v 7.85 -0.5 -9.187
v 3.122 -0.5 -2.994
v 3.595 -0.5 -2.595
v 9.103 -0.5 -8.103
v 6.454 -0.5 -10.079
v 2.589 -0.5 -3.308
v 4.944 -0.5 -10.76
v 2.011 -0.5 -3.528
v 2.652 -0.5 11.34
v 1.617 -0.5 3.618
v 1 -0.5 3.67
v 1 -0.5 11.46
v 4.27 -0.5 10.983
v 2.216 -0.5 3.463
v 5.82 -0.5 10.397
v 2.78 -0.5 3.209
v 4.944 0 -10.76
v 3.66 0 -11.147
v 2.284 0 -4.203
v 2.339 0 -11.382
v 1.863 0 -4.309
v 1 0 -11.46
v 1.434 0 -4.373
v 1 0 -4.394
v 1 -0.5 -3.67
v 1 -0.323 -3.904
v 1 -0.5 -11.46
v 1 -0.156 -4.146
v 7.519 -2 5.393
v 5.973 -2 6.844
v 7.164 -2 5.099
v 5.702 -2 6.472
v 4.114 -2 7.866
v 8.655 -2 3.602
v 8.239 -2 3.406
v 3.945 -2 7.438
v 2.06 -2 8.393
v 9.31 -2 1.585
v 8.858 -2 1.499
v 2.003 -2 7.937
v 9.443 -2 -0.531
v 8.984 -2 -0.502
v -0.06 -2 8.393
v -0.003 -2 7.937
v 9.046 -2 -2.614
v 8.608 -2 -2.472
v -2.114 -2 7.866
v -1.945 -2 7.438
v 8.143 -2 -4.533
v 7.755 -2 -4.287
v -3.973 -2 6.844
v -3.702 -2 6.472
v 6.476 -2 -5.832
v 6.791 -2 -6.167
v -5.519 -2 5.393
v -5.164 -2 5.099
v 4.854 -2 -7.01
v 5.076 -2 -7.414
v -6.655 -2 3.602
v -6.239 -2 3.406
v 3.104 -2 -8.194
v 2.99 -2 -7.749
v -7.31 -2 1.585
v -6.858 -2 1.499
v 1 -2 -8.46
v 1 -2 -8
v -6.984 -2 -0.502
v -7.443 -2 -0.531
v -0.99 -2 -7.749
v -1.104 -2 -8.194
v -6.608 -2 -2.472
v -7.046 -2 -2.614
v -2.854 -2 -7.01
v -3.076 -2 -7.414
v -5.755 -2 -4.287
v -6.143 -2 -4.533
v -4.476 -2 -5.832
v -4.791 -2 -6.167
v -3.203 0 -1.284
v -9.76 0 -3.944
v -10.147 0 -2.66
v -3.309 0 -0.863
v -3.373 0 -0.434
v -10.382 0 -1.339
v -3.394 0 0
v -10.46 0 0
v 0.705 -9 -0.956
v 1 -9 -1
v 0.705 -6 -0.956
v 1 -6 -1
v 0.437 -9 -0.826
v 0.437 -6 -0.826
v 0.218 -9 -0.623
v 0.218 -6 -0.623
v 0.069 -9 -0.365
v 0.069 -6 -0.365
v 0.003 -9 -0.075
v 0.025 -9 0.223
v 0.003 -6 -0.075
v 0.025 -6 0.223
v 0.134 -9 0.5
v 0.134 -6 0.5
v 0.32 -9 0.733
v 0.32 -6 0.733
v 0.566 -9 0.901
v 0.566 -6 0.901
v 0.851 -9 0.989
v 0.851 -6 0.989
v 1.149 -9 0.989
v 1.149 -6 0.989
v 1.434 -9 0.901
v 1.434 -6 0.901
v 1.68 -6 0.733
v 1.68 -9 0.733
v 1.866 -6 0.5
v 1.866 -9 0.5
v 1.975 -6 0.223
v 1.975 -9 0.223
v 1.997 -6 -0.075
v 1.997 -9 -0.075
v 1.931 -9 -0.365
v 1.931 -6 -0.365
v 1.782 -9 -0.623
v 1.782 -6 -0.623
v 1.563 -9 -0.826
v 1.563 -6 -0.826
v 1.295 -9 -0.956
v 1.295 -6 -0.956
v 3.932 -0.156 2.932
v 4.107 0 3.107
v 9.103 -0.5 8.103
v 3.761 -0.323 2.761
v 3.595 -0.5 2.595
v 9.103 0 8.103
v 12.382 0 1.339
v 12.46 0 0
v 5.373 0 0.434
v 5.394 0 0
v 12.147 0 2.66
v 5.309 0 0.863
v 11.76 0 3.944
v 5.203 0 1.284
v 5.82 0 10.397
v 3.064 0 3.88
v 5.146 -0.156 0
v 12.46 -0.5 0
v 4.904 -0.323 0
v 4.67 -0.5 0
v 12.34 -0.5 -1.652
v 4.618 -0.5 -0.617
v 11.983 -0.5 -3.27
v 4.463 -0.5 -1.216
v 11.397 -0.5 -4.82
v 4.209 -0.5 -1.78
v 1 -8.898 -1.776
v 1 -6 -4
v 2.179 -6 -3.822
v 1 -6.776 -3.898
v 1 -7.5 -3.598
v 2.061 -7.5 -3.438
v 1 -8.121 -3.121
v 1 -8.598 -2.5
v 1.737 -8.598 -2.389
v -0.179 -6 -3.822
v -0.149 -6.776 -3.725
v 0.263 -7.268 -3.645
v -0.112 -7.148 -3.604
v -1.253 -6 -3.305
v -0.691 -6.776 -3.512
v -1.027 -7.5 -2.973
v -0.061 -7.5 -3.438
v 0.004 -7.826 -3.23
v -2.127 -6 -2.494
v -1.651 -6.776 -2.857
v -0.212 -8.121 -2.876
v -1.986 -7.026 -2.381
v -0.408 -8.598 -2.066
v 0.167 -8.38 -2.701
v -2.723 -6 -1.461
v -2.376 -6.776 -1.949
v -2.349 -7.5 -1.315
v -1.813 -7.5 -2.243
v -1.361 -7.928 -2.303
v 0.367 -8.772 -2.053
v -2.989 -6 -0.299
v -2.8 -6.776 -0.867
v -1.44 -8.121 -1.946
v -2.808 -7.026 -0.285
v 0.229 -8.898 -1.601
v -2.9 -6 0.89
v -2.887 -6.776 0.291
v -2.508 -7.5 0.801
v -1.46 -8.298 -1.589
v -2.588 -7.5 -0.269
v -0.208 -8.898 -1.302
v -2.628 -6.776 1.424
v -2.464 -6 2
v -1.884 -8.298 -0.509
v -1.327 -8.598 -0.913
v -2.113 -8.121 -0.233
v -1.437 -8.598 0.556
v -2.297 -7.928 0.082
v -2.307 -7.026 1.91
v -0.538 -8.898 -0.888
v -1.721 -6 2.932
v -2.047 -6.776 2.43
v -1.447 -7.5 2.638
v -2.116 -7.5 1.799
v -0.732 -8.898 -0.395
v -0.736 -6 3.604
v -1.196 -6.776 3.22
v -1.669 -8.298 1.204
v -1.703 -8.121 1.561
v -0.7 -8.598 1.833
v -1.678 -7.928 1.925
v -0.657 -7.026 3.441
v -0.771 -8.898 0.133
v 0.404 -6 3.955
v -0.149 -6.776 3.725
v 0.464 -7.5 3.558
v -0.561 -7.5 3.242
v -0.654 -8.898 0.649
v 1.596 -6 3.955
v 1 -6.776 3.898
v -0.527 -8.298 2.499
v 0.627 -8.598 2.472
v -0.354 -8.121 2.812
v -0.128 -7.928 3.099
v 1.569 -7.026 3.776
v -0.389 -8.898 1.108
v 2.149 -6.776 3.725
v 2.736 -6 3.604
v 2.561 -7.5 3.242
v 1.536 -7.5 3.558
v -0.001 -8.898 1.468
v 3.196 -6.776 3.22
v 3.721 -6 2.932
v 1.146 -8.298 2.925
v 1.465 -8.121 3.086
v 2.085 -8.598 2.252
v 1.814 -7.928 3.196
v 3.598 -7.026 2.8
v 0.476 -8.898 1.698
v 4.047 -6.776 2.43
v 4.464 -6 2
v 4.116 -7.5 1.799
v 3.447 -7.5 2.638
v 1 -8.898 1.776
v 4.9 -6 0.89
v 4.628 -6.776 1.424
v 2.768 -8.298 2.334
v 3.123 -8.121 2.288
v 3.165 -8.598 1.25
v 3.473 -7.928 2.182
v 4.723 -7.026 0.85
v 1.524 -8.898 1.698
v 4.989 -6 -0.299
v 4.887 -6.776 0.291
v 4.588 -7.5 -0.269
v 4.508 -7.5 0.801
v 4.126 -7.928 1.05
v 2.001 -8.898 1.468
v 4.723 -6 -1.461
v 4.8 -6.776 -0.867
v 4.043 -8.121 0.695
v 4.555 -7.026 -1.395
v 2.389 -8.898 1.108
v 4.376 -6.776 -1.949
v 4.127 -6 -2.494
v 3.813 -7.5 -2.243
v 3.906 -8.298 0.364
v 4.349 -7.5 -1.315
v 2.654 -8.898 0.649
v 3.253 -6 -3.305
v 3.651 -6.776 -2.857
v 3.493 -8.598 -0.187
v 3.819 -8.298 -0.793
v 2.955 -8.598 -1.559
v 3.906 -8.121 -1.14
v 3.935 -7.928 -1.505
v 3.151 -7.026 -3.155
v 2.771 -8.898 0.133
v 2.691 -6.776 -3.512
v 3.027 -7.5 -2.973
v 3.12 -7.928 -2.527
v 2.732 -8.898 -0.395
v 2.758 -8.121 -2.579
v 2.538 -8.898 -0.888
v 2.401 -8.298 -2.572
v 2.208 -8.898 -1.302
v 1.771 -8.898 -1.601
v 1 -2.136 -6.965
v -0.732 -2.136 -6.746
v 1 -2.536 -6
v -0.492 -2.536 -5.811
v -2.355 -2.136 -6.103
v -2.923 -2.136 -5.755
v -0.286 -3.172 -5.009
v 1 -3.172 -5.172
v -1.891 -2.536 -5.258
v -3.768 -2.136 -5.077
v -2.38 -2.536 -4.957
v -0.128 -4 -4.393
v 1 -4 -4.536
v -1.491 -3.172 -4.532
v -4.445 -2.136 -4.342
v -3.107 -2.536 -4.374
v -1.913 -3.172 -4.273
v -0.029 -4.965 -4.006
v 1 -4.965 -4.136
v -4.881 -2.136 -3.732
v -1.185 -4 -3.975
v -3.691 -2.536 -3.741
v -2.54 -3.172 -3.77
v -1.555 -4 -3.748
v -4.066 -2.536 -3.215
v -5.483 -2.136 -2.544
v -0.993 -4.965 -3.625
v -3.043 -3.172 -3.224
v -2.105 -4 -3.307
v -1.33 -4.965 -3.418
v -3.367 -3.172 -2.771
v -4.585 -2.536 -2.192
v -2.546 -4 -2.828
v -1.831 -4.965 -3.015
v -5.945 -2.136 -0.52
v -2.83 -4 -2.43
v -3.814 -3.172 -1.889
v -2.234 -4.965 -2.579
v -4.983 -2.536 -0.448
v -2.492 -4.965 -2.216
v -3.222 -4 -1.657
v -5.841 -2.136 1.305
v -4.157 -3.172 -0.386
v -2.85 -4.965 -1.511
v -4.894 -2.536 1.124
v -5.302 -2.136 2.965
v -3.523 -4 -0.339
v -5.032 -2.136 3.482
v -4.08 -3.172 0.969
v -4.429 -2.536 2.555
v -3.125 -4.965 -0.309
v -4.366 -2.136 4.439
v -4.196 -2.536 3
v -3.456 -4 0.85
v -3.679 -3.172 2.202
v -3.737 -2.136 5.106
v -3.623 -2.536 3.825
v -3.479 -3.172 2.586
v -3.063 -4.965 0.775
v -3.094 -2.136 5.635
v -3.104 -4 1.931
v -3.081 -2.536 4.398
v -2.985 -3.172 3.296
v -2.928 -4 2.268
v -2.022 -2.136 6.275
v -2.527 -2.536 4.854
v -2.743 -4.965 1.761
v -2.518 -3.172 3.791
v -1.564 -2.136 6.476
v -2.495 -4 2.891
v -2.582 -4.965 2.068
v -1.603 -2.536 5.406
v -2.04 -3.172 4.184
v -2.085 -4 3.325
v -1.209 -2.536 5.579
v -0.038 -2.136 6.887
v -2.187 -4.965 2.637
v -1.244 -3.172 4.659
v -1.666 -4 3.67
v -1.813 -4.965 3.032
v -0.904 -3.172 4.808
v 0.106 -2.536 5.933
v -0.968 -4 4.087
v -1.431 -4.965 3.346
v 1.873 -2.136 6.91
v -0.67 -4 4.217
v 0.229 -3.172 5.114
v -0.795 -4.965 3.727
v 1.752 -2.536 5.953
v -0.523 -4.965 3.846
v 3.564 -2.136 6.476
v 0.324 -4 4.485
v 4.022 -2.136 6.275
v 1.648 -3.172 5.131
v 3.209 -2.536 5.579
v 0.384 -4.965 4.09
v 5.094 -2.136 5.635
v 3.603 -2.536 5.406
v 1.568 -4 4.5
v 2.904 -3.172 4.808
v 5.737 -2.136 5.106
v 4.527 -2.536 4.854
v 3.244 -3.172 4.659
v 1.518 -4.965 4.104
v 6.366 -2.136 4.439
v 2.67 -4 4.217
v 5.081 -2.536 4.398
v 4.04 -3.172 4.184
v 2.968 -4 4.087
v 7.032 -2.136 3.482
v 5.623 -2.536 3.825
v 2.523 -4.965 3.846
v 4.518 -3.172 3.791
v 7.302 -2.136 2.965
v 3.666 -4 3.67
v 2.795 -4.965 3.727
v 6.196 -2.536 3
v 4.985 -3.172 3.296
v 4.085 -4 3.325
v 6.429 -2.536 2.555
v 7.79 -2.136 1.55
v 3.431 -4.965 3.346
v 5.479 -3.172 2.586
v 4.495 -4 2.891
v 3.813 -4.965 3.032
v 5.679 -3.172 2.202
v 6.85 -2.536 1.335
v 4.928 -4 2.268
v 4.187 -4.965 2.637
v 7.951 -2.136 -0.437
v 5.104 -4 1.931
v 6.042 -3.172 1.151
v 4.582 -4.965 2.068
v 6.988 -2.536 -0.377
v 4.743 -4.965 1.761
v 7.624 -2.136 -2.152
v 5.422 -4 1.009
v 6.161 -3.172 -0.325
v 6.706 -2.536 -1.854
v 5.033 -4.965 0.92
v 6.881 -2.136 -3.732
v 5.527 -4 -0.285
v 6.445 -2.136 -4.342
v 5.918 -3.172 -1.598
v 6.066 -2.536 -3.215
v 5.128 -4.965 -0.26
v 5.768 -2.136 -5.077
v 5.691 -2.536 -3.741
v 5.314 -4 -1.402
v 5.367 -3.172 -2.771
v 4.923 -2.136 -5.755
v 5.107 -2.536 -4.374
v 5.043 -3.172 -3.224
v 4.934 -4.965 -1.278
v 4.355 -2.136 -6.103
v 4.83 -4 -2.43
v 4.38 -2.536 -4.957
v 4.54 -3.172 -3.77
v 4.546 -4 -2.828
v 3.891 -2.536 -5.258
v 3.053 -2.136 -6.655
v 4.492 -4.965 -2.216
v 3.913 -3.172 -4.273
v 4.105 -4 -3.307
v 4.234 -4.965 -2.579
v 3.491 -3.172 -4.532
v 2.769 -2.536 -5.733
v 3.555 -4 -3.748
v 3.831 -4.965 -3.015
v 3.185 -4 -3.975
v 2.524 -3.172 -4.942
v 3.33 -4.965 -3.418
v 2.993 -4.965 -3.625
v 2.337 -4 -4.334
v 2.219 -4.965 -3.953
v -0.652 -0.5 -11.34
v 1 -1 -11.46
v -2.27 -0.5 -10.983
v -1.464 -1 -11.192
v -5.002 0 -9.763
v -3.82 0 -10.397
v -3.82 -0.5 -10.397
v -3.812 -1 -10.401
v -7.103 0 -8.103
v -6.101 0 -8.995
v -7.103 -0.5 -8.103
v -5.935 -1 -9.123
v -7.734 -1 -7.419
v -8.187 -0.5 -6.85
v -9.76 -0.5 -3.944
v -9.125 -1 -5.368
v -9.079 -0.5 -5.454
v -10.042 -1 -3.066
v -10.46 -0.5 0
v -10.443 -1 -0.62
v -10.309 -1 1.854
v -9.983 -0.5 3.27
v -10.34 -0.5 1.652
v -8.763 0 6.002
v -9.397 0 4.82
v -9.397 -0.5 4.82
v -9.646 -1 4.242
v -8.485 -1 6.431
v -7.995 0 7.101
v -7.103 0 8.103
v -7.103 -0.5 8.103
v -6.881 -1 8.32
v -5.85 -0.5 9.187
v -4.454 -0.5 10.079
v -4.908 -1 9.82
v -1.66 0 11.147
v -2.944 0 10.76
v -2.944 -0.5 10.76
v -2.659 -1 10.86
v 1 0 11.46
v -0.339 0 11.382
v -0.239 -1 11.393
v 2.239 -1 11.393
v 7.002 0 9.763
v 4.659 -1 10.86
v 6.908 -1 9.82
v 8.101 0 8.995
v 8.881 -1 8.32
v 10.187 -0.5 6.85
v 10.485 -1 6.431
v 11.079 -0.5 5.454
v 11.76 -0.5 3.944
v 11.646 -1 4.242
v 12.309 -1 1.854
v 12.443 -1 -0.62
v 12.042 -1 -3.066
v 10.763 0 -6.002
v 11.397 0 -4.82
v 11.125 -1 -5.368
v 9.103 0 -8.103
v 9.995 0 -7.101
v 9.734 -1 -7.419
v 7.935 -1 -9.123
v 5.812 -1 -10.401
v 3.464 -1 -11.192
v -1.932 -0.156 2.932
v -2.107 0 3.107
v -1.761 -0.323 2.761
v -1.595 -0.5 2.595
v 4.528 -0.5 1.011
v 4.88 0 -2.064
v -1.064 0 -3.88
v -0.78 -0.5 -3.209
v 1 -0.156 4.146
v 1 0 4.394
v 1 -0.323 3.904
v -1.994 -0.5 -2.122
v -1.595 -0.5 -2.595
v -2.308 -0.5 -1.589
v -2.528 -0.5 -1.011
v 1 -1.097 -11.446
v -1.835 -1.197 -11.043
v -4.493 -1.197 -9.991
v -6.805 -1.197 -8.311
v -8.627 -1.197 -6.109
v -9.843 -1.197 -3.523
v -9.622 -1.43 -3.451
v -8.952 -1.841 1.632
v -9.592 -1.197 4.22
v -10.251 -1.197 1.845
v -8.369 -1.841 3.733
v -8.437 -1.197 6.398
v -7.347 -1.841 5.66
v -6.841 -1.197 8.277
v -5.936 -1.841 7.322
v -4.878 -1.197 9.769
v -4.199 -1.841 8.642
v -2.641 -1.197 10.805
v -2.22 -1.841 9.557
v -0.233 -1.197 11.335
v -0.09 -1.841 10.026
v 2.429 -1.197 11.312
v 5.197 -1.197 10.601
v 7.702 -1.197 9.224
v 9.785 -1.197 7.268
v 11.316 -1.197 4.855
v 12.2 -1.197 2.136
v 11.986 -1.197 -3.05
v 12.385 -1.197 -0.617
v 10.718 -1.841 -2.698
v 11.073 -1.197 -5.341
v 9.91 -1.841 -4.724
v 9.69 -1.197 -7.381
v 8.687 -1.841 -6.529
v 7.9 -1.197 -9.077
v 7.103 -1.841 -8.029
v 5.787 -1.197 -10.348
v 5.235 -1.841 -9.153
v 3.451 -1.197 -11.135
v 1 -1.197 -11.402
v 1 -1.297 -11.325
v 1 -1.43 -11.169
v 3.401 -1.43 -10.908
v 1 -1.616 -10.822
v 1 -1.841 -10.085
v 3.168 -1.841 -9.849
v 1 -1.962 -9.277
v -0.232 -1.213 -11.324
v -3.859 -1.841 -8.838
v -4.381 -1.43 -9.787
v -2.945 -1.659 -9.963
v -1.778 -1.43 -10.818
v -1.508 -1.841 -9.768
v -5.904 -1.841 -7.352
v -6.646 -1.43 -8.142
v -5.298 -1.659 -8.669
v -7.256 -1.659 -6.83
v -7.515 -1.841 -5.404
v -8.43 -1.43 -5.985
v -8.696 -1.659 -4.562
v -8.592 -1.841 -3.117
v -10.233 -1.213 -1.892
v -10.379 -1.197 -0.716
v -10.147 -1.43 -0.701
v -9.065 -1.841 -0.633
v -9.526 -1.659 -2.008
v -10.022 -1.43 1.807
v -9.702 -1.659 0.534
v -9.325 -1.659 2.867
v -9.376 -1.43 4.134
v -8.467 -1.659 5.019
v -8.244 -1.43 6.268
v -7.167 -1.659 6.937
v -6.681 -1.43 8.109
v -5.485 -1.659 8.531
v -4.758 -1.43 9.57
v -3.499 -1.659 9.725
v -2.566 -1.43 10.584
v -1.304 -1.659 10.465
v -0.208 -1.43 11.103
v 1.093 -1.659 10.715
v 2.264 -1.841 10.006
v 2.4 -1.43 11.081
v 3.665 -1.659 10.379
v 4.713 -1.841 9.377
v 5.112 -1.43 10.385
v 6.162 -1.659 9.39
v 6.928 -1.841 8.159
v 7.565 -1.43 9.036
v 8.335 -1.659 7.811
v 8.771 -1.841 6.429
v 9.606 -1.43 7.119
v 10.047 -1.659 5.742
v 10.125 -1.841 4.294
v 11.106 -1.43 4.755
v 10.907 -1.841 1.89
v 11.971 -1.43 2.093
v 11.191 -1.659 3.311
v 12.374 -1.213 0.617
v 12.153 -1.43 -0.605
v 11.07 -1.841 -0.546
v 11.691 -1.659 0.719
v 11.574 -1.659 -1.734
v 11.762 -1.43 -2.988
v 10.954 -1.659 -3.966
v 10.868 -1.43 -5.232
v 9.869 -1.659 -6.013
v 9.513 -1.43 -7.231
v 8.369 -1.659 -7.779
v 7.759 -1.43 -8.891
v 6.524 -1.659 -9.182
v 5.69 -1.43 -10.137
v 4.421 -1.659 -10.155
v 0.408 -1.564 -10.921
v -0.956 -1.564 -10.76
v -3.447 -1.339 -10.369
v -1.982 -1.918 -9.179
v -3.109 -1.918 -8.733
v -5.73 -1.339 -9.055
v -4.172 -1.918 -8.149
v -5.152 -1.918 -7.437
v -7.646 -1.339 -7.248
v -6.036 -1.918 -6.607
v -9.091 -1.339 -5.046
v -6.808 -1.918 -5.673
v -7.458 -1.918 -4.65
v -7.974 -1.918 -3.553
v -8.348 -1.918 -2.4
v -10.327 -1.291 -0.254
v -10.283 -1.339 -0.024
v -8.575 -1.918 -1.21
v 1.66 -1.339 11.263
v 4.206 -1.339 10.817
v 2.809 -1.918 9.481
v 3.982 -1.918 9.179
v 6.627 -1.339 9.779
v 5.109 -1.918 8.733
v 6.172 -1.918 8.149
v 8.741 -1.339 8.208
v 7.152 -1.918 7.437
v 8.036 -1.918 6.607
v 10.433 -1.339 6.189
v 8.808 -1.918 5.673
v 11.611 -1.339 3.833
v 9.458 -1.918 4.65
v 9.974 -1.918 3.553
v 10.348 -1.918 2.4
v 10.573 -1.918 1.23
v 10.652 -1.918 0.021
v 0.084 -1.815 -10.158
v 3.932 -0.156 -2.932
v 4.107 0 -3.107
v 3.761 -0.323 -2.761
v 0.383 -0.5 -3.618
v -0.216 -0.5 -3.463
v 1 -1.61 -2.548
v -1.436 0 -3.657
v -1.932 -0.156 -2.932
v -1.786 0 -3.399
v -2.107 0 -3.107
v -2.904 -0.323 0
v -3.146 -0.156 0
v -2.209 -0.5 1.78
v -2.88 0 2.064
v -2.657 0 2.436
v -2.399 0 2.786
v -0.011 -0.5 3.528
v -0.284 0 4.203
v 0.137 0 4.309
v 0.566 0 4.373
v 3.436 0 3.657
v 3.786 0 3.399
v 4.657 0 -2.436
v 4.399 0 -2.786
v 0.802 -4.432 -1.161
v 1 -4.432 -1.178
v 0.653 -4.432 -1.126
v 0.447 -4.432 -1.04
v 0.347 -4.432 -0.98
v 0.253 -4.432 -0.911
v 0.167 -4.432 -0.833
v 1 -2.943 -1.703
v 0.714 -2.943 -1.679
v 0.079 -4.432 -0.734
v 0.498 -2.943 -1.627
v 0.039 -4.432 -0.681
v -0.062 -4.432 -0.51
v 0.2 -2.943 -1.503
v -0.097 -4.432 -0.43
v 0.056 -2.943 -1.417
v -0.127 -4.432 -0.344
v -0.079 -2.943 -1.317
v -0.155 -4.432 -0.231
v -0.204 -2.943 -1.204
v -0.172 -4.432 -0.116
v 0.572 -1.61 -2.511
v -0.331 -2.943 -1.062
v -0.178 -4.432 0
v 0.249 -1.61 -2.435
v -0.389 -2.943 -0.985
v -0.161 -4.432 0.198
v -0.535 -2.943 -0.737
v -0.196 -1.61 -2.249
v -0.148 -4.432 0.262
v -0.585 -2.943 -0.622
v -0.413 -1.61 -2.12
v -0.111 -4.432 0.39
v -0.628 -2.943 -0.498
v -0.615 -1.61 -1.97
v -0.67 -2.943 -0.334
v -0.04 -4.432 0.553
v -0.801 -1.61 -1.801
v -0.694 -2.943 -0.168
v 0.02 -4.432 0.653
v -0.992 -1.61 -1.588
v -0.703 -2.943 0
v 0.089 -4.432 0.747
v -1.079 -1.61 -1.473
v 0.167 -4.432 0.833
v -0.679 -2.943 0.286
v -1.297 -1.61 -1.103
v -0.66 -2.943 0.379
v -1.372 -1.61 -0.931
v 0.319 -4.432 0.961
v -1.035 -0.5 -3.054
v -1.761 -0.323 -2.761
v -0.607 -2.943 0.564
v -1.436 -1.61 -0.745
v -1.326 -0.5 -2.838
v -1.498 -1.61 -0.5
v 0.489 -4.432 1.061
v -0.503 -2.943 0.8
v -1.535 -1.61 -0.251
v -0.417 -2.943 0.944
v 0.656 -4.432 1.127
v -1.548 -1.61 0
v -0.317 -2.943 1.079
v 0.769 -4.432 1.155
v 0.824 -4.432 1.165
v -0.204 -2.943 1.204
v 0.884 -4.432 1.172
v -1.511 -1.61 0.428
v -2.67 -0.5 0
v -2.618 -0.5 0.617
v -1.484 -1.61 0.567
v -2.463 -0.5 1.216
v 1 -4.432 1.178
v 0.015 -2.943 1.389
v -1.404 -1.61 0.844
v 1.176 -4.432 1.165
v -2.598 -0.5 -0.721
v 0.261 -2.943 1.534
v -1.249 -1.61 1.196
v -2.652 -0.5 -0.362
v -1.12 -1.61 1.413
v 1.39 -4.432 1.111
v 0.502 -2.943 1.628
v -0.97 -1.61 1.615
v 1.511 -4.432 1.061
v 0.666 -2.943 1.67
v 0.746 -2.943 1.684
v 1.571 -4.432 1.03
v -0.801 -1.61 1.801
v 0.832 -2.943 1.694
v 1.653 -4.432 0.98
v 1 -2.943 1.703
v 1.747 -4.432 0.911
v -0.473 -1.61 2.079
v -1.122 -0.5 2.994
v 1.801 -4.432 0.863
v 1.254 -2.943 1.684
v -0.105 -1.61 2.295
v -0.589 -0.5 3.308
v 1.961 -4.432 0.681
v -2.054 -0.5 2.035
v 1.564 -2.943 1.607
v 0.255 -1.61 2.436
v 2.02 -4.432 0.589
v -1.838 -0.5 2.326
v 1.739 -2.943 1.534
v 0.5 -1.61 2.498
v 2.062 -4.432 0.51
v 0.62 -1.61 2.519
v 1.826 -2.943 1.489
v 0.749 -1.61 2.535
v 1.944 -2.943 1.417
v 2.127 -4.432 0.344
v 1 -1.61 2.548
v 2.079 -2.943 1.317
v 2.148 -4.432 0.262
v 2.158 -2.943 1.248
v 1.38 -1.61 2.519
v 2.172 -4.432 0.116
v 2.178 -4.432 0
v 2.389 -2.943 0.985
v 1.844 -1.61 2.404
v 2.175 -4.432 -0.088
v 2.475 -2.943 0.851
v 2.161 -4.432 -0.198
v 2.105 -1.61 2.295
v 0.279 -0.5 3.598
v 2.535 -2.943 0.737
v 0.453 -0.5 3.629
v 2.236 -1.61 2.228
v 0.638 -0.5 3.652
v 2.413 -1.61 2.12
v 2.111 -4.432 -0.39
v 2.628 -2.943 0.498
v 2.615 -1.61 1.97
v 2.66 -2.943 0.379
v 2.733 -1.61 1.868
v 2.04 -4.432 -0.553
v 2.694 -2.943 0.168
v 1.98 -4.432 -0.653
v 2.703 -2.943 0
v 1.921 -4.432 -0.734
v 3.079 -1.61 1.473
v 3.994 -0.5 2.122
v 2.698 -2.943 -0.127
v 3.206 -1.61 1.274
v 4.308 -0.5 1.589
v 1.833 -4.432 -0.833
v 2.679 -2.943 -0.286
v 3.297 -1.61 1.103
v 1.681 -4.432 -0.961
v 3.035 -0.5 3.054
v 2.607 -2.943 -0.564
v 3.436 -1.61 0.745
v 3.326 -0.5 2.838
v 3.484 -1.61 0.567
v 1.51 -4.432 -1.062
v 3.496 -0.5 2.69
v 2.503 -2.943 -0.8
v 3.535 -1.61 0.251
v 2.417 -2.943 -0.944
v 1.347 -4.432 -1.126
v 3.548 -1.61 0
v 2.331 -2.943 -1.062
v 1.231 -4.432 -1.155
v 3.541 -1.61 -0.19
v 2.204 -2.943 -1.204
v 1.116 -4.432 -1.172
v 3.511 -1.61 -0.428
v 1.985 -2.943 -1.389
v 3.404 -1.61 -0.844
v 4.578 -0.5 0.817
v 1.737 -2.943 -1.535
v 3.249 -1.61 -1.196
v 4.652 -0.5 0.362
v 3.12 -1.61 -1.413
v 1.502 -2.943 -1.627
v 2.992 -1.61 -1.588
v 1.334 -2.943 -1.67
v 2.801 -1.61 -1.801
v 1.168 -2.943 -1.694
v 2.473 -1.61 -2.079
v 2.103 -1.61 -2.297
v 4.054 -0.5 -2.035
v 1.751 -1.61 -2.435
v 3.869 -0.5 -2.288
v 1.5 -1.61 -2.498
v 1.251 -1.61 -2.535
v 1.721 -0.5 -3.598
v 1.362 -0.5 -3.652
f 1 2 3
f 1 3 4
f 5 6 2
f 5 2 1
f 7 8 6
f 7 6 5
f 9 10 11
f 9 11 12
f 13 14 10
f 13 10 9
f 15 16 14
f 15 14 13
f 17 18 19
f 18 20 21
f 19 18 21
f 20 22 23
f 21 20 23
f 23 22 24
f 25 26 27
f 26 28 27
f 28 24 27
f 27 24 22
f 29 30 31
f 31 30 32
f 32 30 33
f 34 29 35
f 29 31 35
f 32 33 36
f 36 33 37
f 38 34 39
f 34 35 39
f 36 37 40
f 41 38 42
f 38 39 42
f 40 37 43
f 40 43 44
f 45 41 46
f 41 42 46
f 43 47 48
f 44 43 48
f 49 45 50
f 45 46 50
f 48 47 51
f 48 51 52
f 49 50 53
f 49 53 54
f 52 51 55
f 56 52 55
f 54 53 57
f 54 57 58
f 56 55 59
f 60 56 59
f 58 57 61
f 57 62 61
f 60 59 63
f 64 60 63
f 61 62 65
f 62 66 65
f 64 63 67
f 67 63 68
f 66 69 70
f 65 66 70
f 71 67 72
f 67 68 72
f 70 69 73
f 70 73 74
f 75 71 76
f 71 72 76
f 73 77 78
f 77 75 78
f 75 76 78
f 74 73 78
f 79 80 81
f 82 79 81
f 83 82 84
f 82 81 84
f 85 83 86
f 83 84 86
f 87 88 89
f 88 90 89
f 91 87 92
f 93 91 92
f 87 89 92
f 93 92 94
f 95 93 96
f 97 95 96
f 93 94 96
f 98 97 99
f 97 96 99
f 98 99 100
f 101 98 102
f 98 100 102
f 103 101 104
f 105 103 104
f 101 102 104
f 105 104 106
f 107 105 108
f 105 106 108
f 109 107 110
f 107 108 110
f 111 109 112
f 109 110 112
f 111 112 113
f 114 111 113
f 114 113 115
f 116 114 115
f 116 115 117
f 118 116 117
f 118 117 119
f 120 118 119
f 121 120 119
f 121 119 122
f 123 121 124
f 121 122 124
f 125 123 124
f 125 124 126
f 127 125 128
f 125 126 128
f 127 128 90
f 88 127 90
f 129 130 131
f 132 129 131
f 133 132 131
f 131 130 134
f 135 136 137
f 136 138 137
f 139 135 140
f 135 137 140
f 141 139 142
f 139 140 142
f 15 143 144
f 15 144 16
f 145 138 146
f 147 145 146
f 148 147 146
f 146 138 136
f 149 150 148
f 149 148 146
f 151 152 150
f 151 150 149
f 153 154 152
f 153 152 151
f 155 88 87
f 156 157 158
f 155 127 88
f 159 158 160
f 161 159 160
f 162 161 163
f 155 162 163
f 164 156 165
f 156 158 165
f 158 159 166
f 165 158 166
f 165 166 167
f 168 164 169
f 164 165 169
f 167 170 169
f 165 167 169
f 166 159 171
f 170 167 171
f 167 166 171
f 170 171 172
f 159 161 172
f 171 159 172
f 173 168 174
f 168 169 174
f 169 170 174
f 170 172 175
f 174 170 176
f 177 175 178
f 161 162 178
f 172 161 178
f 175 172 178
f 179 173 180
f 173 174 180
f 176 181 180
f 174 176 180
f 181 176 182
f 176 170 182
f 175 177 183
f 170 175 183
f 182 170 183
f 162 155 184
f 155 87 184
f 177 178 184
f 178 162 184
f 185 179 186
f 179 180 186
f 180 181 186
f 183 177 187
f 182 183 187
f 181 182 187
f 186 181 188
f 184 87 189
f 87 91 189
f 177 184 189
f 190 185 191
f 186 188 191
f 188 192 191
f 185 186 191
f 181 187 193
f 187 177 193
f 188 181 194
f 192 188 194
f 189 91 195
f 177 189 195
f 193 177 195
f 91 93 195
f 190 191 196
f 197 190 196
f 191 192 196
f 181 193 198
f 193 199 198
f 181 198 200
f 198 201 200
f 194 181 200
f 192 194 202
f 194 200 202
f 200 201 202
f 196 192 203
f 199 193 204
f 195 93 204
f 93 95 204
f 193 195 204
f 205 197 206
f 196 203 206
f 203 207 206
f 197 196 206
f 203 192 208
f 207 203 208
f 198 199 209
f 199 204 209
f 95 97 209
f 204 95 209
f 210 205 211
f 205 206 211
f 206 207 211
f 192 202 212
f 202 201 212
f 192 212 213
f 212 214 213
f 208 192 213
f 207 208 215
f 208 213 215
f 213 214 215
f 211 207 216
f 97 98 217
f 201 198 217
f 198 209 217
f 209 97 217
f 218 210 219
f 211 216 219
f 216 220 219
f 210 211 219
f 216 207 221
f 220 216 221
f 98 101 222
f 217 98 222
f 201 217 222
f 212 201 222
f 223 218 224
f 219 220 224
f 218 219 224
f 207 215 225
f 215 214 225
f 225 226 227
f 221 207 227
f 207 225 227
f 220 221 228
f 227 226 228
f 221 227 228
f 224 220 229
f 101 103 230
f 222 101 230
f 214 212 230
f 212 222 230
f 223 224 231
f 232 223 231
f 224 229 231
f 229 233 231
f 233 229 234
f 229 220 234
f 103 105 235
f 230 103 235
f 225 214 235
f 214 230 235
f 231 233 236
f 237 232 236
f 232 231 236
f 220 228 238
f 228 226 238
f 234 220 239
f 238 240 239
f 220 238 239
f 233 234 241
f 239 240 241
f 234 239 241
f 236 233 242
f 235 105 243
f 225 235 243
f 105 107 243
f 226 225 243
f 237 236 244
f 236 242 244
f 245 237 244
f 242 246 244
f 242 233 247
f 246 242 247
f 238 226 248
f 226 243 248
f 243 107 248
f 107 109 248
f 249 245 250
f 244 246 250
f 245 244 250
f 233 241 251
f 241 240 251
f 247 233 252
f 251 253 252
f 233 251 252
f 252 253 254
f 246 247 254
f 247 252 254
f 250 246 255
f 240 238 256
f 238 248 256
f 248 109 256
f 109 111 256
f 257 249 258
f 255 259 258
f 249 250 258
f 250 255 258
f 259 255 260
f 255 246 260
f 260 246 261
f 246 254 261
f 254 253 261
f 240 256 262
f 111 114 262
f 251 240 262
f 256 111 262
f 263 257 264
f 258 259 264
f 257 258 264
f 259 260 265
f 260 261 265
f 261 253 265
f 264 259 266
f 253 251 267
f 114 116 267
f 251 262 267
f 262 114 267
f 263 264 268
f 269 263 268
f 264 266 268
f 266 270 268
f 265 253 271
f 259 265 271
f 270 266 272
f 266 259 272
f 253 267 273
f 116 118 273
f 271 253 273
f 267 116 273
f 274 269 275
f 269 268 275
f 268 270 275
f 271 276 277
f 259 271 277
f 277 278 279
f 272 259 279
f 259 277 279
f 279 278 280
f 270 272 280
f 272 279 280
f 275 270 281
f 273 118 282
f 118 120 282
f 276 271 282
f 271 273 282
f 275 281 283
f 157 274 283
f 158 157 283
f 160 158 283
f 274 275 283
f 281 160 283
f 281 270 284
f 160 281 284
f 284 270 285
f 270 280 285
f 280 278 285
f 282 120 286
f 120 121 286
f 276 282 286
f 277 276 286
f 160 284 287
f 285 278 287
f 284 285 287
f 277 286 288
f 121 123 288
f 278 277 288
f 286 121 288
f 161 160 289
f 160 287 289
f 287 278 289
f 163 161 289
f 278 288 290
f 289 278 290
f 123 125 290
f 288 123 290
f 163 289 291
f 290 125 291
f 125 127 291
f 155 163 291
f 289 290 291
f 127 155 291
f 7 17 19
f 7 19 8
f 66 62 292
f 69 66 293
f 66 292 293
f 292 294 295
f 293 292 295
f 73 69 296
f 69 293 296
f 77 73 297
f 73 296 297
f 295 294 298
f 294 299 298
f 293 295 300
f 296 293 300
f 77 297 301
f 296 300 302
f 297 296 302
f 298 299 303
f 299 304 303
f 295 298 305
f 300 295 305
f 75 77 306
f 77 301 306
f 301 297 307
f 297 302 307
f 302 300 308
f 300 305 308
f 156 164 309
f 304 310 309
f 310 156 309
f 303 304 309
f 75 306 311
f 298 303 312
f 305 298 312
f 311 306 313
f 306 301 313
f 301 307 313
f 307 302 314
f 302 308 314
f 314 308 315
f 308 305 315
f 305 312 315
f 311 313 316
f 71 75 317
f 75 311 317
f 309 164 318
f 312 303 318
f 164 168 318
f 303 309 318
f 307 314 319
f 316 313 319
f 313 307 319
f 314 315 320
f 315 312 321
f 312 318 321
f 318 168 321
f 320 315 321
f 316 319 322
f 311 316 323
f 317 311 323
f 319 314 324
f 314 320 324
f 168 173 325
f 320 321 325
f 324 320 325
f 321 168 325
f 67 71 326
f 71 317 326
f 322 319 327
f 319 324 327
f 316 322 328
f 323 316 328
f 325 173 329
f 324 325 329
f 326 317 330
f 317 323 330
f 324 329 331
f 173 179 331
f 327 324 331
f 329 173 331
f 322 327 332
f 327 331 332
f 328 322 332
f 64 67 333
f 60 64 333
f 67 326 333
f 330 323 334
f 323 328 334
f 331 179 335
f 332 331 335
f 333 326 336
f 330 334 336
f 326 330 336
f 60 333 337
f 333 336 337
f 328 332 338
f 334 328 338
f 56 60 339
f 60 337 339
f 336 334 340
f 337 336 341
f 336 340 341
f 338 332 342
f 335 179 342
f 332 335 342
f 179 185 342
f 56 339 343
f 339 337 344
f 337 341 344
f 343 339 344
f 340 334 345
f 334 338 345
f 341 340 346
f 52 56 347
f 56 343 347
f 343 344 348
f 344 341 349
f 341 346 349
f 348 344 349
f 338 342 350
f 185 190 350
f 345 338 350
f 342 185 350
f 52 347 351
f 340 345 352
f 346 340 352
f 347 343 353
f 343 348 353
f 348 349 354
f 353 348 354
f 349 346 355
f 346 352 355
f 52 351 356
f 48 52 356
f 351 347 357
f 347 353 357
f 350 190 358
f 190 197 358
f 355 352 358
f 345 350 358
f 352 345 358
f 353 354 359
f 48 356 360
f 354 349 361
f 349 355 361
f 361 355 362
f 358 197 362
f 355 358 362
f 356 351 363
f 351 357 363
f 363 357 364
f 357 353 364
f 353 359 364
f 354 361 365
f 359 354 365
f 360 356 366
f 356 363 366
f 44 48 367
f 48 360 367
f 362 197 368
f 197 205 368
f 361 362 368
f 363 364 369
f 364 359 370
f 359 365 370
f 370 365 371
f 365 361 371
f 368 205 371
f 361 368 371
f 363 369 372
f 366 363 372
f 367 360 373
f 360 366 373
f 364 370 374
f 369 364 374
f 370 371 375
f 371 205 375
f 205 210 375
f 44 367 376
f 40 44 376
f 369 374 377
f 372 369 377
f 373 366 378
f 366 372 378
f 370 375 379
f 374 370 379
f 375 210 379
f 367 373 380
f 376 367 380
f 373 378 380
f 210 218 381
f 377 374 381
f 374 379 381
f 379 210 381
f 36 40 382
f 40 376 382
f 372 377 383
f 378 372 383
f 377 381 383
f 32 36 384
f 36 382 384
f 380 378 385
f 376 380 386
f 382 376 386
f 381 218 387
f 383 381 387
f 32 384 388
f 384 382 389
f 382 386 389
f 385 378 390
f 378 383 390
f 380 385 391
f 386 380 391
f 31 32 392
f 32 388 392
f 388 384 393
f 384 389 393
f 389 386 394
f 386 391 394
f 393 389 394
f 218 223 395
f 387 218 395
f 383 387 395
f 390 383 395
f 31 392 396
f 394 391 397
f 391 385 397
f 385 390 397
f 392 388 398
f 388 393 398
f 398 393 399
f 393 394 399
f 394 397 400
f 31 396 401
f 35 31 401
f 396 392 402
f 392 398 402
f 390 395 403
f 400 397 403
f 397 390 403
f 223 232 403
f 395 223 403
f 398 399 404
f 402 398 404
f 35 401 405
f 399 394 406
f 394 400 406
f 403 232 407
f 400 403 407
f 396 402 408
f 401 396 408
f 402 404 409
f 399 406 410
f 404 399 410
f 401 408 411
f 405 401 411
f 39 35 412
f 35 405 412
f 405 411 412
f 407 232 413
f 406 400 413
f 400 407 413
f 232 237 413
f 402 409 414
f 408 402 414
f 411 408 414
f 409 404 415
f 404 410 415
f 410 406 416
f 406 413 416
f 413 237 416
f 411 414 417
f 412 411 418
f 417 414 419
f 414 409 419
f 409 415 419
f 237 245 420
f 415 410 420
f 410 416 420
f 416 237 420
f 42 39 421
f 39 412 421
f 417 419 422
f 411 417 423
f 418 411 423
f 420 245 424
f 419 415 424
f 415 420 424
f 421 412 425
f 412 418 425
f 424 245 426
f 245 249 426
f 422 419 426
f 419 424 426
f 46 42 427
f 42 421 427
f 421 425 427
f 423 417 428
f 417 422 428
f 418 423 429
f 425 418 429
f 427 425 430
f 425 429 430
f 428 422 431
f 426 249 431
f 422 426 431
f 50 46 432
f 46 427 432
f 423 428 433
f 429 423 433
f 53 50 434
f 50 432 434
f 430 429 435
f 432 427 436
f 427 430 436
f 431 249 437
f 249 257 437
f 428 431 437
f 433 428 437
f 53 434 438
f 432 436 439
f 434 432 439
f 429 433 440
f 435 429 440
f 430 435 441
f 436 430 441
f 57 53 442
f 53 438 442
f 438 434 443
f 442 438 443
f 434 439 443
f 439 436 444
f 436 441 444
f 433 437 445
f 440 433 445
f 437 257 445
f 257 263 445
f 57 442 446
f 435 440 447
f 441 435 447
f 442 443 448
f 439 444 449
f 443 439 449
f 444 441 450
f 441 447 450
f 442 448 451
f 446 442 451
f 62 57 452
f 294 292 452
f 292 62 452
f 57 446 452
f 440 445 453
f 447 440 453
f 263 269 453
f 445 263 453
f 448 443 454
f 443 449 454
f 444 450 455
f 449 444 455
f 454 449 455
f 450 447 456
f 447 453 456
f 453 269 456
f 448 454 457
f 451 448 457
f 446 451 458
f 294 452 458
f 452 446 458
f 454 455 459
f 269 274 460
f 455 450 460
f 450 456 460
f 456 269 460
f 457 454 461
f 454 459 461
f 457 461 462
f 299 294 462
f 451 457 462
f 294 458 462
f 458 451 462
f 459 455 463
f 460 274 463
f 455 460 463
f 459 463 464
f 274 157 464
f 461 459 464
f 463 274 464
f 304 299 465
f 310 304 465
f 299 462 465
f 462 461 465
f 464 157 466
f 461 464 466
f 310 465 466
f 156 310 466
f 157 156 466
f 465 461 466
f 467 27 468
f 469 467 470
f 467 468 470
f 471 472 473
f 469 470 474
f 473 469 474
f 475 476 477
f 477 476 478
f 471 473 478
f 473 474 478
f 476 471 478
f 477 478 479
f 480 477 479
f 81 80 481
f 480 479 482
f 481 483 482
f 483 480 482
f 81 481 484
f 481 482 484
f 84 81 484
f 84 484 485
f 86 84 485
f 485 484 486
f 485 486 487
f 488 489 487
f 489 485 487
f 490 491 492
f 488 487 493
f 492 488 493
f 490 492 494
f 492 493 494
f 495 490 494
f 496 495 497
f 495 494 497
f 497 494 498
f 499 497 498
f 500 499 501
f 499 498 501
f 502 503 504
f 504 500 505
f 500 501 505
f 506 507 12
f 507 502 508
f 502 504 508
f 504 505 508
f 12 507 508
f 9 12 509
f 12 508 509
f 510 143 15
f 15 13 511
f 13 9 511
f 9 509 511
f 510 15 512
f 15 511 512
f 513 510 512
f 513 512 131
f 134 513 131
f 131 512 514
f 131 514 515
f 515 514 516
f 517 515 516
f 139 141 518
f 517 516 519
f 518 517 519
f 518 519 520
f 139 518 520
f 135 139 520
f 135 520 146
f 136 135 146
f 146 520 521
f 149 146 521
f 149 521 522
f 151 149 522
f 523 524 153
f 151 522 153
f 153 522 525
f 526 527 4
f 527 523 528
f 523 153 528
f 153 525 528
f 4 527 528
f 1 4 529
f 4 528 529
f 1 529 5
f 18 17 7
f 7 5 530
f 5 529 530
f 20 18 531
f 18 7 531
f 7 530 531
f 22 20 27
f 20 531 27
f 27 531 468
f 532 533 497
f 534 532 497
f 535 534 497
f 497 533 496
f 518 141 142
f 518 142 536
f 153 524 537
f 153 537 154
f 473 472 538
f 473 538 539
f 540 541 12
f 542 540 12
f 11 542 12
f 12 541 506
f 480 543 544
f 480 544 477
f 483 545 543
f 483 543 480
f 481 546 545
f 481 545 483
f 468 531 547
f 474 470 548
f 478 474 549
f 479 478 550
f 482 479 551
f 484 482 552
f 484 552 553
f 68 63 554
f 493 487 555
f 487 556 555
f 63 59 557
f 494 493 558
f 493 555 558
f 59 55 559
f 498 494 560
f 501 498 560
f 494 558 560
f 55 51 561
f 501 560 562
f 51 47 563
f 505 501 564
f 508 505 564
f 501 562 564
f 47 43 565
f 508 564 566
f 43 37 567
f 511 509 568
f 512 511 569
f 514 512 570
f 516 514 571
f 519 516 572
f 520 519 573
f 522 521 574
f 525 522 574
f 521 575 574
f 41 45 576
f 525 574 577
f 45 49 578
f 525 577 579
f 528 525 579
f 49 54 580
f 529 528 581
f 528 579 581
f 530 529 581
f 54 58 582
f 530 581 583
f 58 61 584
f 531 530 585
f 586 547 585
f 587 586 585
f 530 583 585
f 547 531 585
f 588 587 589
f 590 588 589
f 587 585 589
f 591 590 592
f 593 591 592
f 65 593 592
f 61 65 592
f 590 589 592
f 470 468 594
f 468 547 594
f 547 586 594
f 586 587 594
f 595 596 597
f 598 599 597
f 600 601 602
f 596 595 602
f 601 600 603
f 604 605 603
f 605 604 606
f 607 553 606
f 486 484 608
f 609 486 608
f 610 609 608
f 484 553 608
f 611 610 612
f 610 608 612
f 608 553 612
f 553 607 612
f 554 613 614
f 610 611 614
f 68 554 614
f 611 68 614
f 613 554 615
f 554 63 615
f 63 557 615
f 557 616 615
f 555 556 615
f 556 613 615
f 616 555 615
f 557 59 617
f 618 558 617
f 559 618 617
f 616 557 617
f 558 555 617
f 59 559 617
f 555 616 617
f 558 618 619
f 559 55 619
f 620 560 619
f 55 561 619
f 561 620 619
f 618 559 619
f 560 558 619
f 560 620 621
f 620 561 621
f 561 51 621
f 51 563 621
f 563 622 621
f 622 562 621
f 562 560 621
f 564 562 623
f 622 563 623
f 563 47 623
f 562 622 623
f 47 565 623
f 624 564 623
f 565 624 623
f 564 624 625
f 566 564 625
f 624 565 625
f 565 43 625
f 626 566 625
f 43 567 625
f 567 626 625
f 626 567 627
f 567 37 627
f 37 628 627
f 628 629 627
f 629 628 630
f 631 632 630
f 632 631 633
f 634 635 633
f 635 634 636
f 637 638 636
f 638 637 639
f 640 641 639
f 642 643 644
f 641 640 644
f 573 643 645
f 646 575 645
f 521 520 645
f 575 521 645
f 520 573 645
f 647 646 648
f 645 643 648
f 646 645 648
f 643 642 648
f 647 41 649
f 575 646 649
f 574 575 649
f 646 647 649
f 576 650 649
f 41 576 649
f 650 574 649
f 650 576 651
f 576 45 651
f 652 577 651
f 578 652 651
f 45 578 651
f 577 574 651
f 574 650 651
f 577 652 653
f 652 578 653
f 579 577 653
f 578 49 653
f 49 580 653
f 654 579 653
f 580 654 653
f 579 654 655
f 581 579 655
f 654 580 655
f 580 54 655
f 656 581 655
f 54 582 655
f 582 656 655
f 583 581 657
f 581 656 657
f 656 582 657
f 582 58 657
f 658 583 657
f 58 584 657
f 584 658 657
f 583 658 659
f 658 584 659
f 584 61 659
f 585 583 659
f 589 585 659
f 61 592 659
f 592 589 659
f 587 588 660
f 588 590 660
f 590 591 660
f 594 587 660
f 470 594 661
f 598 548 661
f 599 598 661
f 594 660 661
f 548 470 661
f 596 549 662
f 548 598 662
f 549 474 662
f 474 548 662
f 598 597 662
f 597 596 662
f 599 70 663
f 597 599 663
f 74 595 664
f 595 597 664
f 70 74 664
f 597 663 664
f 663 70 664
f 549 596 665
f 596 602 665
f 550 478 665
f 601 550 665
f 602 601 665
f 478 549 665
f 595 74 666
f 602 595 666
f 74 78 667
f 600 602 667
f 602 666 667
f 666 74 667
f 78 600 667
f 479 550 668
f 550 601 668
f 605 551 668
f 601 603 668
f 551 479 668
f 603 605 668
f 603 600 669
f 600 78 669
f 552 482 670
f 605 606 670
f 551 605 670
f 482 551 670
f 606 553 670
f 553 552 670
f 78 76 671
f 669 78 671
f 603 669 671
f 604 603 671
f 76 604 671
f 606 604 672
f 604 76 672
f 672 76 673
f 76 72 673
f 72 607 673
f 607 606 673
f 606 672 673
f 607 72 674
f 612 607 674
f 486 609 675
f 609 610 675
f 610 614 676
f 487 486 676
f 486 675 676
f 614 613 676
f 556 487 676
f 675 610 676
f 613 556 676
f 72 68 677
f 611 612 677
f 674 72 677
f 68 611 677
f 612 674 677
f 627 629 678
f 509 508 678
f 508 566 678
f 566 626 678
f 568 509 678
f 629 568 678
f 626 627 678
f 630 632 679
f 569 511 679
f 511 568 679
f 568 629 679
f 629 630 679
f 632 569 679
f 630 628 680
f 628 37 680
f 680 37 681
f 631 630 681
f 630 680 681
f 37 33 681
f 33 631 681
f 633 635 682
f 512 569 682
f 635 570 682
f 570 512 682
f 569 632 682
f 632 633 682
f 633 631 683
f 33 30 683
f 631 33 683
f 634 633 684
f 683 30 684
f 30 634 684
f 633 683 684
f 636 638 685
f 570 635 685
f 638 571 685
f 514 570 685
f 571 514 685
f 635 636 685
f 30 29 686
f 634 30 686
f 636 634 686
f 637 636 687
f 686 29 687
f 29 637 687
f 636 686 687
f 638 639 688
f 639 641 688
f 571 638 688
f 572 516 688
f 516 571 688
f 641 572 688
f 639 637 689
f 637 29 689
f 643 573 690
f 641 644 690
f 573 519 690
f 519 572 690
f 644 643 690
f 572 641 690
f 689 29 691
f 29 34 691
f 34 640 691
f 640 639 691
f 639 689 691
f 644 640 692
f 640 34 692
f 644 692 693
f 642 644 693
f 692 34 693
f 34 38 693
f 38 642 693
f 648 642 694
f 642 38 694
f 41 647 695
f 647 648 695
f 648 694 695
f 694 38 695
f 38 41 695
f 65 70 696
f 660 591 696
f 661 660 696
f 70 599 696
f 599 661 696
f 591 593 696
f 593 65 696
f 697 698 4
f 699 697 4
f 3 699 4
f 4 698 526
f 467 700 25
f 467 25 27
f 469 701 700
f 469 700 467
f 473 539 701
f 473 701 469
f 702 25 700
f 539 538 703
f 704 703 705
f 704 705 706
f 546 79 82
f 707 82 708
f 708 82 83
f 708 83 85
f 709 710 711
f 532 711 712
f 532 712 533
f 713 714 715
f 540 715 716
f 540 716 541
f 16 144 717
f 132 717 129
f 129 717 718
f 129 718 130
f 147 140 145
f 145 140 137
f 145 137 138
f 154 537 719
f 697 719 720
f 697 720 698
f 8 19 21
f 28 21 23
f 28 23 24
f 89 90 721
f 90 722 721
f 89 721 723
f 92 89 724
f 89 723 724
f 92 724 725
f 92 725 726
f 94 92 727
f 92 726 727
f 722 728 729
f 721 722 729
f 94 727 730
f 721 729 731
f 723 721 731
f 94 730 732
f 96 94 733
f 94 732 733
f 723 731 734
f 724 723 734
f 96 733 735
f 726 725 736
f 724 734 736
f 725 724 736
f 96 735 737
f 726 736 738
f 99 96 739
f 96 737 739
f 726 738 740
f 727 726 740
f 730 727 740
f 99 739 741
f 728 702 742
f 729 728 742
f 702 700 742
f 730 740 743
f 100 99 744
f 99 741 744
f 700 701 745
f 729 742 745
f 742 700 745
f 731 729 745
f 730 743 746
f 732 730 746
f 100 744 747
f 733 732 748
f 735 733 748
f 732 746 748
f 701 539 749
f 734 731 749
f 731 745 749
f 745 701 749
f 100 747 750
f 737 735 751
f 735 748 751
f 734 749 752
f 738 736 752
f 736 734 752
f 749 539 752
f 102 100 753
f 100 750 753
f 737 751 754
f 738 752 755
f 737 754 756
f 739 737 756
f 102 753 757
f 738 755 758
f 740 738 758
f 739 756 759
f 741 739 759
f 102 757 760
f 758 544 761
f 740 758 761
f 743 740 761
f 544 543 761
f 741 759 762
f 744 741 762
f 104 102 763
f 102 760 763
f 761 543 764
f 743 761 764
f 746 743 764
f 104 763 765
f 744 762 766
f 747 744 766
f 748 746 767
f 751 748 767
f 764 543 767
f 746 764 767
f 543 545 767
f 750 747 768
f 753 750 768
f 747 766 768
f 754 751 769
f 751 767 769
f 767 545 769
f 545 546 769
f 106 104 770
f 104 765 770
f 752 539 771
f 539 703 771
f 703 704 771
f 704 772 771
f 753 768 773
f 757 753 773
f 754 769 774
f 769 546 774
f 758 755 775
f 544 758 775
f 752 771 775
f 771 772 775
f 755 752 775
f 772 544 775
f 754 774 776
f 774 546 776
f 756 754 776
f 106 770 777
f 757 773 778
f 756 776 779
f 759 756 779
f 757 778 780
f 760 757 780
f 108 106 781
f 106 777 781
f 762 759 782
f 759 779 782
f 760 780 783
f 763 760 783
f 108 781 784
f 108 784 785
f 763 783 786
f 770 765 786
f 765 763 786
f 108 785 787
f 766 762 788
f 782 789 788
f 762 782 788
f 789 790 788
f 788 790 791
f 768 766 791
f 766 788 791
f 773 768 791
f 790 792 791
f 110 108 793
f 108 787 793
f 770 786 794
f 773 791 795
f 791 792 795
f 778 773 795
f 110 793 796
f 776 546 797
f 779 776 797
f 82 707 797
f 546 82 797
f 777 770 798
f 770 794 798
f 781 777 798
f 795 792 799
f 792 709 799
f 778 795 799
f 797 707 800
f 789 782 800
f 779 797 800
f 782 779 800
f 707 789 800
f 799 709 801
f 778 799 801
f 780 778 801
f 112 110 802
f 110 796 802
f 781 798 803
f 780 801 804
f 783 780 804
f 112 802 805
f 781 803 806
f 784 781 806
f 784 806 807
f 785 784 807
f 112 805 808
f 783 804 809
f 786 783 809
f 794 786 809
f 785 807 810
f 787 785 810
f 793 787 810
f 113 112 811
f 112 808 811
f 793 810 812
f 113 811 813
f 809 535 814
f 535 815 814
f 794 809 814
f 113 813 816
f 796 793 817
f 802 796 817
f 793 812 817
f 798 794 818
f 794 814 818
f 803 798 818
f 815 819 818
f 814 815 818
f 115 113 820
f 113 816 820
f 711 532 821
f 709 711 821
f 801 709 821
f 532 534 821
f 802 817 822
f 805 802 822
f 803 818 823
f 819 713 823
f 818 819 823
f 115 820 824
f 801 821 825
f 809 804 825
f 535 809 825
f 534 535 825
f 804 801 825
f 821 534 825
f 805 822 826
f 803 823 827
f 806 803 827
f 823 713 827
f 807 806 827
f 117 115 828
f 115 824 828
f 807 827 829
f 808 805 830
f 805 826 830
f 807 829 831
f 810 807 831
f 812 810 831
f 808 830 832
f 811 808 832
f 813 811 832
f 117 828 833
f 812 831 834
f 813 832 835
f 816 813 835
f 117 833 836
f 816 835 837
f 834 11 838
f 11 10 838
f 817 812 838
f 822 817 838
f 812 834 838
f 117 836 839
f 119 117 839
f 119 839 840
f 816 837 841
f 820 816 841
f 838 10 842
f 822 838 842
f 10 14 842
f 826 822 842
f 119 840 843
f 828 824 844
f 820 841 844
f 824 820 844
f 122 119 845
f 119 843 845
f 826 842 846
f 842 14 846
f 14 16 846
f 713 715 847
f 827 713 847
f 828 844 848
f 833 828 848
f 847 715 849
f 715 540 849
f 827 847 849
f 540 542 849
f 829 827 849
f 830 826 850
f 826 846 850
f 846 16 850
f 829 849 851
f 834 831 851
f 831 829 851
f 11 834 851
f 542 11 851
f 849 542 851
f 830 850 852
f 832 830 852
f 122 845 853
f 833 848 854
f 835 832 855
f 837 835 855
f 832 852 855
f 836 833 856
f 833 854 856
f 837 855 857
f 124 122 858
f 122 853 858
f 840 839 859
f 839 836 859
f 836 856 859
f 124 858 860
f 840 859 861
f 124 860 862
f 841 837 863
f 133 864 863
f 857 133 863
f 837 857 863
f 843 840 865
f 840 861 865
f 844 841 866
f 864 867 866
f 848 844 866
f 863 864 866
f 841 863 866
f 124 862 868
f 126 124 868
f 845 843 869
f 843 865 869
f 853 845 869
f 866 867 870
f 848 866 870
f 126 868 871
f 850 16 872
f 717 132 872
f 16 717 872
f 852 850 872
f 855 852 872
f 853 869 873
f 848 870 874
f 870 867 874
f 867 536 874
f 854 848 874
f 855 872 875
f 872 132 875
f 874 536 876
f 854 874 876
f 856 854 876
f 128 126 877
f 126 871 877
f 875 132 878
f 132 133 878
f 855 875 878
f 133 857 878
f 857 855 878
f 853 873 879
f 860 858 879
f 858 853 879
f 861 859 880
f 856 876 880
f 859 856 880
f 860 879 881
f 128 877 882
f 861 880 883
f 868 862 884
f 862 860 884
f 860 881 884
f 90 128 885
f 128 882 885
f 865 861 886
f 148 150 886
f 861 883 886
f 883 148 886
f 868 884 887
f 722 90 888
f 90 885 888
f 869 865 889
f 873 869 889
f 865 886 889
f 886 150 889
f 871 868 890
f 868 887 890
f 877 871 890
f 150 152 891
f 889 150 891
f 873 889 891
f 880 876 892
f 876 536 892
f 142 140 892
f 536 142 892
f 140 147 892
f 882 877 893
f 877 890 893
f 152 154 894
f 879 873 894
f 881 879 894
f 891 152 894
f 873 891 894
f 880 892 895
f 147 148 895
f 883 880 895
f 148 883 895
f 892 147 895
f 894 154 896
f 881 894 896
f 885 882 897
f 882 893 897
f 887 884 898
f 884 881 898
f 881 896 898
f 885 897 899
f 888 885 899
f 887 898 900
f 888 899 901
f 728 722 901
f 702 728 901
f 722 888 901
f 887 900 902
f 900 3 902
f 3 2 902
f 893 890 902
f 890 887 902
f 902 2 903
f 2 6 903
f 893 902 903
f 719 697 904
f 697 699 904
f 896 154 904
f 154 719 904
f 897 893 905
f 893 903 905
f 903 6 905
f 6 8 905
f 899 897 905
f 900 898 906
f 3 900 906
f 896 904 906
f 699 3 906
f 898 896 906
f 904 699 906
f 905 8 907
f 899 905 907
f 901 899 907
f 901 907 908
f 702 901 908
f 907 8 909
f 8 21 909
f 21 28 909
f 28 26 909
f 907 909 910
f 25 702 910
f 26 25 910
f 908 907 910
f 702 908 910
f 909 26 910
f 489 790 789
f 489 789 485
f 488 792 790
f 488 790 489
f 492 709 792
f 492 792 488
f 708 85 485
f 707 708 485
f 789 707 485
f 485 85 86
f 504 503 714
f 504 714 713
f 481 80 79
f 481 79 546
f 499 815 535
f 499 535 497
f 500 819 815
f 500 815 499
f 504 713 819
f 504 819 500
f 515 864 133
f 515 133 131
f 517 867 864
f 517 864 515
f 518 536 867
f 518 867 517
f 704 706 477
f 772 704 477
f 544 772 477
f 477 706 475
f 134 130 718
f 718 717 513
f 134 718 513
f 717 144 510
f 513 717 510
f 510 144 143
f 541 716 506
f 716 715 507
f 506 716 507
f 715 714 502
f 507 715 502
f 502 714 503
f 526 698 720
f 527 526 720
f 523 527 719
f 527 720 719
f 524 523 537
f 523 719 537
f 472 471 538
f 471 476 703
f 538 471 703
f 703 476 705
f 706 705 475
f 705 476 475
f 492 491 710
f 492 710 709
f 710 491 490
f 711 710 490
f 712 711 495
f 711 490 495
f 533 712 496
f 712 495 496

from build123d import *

# Parameters (mm, degrees)
FILLET3_SIZE       = 1
FILLET3_SIZE_2     = 3
CUT_EXTRUDE5_DEPTH = 0.5
CIRPATTERN3_COUNT  = 8


with BuildPart() as part:
    # Sketch2 → Revolve4 (revolve)
    with BuildSketch(Plane.XY, mode=Mode.PRIVATE) as revolve4_sk:
        with BuildLine():
            Line((-10.46, 0), (-10.46, -2))
            Line((-10.46, -2), (-7, -2))
            ThreePointArc((-7, -2), (-4.171572875, -3.171572875), (-3, -6))
            ThreePointArc((-3, -6), (-2.121320344, -8.121320344), (0, -9))
            Line((0, -9), (0, -6))
            ThreePointArc((0, -6), (-0.907428337, -2.553179648), (-3.394448725, 0))
            Line((-3.394448725, 0), (-10.46, 0))
        make_face()
    revolve(revolve4_sk.sketch.rotate(Axis((1, -9, 0), (0, 1, 0)), 270), axis=Axis((1, -9, 0), (0, 1, 0)))

    # Fillet3
    # an asymmetric fillet: 3, 1 mm, written as the material it takes off along each edge
    with BuildSketch(Plane(origin=(1, -2, 0), x_dir=(0, 0, -1), z_dir=(1, 0, 0))) as fillet3_piece_1:
        with BuildLine():
            Bezier((11.46, FILLET3_SIZE), (11.46, 0), (11.46 - FILLET3_SIZE_2, 0), weights=[1, 0.707106781, 1])
            Line((11.46 - FILLET3_SIZE_2, 0), (11.46, 0))
            Line((11.46, 0), (11.46, FILLET3_SIZE))
        make_face()
    revolve(axis=Axis((1, -2, 0), (0, 1, 0)), mode=Mode.SUBTRACT)

    # Sketch8 → Cut-Extrude5 (cut)
    with BuildSketch(Plane(origin=(0, 0, 0), x_dir=(1, 0, 0), z_dir=(0, 1, 0))):
        Polygon((0, 0), (18.255808177, 0), (16.586053461, 7.014284446), align=None)
    cut_extrude5 = extrude(amount=-CUT_EXTRUDE5_DEPTH, mode=Mode.SUBTRACT)

    # CirPattern3: Cut-Extrude5 ×8 about axis
    cirpattern3_axis = Axis((1, 0, 0), (0, 1, 0))
    for i in range(1, CIRPATTERN3_COUNT):
        add(cut_extrude5.rotate(cirpattern3_axis, i * 360 / CIRPATTERN3_COUNT), mode=Mode.SUBTRACT)


solid = part.part
